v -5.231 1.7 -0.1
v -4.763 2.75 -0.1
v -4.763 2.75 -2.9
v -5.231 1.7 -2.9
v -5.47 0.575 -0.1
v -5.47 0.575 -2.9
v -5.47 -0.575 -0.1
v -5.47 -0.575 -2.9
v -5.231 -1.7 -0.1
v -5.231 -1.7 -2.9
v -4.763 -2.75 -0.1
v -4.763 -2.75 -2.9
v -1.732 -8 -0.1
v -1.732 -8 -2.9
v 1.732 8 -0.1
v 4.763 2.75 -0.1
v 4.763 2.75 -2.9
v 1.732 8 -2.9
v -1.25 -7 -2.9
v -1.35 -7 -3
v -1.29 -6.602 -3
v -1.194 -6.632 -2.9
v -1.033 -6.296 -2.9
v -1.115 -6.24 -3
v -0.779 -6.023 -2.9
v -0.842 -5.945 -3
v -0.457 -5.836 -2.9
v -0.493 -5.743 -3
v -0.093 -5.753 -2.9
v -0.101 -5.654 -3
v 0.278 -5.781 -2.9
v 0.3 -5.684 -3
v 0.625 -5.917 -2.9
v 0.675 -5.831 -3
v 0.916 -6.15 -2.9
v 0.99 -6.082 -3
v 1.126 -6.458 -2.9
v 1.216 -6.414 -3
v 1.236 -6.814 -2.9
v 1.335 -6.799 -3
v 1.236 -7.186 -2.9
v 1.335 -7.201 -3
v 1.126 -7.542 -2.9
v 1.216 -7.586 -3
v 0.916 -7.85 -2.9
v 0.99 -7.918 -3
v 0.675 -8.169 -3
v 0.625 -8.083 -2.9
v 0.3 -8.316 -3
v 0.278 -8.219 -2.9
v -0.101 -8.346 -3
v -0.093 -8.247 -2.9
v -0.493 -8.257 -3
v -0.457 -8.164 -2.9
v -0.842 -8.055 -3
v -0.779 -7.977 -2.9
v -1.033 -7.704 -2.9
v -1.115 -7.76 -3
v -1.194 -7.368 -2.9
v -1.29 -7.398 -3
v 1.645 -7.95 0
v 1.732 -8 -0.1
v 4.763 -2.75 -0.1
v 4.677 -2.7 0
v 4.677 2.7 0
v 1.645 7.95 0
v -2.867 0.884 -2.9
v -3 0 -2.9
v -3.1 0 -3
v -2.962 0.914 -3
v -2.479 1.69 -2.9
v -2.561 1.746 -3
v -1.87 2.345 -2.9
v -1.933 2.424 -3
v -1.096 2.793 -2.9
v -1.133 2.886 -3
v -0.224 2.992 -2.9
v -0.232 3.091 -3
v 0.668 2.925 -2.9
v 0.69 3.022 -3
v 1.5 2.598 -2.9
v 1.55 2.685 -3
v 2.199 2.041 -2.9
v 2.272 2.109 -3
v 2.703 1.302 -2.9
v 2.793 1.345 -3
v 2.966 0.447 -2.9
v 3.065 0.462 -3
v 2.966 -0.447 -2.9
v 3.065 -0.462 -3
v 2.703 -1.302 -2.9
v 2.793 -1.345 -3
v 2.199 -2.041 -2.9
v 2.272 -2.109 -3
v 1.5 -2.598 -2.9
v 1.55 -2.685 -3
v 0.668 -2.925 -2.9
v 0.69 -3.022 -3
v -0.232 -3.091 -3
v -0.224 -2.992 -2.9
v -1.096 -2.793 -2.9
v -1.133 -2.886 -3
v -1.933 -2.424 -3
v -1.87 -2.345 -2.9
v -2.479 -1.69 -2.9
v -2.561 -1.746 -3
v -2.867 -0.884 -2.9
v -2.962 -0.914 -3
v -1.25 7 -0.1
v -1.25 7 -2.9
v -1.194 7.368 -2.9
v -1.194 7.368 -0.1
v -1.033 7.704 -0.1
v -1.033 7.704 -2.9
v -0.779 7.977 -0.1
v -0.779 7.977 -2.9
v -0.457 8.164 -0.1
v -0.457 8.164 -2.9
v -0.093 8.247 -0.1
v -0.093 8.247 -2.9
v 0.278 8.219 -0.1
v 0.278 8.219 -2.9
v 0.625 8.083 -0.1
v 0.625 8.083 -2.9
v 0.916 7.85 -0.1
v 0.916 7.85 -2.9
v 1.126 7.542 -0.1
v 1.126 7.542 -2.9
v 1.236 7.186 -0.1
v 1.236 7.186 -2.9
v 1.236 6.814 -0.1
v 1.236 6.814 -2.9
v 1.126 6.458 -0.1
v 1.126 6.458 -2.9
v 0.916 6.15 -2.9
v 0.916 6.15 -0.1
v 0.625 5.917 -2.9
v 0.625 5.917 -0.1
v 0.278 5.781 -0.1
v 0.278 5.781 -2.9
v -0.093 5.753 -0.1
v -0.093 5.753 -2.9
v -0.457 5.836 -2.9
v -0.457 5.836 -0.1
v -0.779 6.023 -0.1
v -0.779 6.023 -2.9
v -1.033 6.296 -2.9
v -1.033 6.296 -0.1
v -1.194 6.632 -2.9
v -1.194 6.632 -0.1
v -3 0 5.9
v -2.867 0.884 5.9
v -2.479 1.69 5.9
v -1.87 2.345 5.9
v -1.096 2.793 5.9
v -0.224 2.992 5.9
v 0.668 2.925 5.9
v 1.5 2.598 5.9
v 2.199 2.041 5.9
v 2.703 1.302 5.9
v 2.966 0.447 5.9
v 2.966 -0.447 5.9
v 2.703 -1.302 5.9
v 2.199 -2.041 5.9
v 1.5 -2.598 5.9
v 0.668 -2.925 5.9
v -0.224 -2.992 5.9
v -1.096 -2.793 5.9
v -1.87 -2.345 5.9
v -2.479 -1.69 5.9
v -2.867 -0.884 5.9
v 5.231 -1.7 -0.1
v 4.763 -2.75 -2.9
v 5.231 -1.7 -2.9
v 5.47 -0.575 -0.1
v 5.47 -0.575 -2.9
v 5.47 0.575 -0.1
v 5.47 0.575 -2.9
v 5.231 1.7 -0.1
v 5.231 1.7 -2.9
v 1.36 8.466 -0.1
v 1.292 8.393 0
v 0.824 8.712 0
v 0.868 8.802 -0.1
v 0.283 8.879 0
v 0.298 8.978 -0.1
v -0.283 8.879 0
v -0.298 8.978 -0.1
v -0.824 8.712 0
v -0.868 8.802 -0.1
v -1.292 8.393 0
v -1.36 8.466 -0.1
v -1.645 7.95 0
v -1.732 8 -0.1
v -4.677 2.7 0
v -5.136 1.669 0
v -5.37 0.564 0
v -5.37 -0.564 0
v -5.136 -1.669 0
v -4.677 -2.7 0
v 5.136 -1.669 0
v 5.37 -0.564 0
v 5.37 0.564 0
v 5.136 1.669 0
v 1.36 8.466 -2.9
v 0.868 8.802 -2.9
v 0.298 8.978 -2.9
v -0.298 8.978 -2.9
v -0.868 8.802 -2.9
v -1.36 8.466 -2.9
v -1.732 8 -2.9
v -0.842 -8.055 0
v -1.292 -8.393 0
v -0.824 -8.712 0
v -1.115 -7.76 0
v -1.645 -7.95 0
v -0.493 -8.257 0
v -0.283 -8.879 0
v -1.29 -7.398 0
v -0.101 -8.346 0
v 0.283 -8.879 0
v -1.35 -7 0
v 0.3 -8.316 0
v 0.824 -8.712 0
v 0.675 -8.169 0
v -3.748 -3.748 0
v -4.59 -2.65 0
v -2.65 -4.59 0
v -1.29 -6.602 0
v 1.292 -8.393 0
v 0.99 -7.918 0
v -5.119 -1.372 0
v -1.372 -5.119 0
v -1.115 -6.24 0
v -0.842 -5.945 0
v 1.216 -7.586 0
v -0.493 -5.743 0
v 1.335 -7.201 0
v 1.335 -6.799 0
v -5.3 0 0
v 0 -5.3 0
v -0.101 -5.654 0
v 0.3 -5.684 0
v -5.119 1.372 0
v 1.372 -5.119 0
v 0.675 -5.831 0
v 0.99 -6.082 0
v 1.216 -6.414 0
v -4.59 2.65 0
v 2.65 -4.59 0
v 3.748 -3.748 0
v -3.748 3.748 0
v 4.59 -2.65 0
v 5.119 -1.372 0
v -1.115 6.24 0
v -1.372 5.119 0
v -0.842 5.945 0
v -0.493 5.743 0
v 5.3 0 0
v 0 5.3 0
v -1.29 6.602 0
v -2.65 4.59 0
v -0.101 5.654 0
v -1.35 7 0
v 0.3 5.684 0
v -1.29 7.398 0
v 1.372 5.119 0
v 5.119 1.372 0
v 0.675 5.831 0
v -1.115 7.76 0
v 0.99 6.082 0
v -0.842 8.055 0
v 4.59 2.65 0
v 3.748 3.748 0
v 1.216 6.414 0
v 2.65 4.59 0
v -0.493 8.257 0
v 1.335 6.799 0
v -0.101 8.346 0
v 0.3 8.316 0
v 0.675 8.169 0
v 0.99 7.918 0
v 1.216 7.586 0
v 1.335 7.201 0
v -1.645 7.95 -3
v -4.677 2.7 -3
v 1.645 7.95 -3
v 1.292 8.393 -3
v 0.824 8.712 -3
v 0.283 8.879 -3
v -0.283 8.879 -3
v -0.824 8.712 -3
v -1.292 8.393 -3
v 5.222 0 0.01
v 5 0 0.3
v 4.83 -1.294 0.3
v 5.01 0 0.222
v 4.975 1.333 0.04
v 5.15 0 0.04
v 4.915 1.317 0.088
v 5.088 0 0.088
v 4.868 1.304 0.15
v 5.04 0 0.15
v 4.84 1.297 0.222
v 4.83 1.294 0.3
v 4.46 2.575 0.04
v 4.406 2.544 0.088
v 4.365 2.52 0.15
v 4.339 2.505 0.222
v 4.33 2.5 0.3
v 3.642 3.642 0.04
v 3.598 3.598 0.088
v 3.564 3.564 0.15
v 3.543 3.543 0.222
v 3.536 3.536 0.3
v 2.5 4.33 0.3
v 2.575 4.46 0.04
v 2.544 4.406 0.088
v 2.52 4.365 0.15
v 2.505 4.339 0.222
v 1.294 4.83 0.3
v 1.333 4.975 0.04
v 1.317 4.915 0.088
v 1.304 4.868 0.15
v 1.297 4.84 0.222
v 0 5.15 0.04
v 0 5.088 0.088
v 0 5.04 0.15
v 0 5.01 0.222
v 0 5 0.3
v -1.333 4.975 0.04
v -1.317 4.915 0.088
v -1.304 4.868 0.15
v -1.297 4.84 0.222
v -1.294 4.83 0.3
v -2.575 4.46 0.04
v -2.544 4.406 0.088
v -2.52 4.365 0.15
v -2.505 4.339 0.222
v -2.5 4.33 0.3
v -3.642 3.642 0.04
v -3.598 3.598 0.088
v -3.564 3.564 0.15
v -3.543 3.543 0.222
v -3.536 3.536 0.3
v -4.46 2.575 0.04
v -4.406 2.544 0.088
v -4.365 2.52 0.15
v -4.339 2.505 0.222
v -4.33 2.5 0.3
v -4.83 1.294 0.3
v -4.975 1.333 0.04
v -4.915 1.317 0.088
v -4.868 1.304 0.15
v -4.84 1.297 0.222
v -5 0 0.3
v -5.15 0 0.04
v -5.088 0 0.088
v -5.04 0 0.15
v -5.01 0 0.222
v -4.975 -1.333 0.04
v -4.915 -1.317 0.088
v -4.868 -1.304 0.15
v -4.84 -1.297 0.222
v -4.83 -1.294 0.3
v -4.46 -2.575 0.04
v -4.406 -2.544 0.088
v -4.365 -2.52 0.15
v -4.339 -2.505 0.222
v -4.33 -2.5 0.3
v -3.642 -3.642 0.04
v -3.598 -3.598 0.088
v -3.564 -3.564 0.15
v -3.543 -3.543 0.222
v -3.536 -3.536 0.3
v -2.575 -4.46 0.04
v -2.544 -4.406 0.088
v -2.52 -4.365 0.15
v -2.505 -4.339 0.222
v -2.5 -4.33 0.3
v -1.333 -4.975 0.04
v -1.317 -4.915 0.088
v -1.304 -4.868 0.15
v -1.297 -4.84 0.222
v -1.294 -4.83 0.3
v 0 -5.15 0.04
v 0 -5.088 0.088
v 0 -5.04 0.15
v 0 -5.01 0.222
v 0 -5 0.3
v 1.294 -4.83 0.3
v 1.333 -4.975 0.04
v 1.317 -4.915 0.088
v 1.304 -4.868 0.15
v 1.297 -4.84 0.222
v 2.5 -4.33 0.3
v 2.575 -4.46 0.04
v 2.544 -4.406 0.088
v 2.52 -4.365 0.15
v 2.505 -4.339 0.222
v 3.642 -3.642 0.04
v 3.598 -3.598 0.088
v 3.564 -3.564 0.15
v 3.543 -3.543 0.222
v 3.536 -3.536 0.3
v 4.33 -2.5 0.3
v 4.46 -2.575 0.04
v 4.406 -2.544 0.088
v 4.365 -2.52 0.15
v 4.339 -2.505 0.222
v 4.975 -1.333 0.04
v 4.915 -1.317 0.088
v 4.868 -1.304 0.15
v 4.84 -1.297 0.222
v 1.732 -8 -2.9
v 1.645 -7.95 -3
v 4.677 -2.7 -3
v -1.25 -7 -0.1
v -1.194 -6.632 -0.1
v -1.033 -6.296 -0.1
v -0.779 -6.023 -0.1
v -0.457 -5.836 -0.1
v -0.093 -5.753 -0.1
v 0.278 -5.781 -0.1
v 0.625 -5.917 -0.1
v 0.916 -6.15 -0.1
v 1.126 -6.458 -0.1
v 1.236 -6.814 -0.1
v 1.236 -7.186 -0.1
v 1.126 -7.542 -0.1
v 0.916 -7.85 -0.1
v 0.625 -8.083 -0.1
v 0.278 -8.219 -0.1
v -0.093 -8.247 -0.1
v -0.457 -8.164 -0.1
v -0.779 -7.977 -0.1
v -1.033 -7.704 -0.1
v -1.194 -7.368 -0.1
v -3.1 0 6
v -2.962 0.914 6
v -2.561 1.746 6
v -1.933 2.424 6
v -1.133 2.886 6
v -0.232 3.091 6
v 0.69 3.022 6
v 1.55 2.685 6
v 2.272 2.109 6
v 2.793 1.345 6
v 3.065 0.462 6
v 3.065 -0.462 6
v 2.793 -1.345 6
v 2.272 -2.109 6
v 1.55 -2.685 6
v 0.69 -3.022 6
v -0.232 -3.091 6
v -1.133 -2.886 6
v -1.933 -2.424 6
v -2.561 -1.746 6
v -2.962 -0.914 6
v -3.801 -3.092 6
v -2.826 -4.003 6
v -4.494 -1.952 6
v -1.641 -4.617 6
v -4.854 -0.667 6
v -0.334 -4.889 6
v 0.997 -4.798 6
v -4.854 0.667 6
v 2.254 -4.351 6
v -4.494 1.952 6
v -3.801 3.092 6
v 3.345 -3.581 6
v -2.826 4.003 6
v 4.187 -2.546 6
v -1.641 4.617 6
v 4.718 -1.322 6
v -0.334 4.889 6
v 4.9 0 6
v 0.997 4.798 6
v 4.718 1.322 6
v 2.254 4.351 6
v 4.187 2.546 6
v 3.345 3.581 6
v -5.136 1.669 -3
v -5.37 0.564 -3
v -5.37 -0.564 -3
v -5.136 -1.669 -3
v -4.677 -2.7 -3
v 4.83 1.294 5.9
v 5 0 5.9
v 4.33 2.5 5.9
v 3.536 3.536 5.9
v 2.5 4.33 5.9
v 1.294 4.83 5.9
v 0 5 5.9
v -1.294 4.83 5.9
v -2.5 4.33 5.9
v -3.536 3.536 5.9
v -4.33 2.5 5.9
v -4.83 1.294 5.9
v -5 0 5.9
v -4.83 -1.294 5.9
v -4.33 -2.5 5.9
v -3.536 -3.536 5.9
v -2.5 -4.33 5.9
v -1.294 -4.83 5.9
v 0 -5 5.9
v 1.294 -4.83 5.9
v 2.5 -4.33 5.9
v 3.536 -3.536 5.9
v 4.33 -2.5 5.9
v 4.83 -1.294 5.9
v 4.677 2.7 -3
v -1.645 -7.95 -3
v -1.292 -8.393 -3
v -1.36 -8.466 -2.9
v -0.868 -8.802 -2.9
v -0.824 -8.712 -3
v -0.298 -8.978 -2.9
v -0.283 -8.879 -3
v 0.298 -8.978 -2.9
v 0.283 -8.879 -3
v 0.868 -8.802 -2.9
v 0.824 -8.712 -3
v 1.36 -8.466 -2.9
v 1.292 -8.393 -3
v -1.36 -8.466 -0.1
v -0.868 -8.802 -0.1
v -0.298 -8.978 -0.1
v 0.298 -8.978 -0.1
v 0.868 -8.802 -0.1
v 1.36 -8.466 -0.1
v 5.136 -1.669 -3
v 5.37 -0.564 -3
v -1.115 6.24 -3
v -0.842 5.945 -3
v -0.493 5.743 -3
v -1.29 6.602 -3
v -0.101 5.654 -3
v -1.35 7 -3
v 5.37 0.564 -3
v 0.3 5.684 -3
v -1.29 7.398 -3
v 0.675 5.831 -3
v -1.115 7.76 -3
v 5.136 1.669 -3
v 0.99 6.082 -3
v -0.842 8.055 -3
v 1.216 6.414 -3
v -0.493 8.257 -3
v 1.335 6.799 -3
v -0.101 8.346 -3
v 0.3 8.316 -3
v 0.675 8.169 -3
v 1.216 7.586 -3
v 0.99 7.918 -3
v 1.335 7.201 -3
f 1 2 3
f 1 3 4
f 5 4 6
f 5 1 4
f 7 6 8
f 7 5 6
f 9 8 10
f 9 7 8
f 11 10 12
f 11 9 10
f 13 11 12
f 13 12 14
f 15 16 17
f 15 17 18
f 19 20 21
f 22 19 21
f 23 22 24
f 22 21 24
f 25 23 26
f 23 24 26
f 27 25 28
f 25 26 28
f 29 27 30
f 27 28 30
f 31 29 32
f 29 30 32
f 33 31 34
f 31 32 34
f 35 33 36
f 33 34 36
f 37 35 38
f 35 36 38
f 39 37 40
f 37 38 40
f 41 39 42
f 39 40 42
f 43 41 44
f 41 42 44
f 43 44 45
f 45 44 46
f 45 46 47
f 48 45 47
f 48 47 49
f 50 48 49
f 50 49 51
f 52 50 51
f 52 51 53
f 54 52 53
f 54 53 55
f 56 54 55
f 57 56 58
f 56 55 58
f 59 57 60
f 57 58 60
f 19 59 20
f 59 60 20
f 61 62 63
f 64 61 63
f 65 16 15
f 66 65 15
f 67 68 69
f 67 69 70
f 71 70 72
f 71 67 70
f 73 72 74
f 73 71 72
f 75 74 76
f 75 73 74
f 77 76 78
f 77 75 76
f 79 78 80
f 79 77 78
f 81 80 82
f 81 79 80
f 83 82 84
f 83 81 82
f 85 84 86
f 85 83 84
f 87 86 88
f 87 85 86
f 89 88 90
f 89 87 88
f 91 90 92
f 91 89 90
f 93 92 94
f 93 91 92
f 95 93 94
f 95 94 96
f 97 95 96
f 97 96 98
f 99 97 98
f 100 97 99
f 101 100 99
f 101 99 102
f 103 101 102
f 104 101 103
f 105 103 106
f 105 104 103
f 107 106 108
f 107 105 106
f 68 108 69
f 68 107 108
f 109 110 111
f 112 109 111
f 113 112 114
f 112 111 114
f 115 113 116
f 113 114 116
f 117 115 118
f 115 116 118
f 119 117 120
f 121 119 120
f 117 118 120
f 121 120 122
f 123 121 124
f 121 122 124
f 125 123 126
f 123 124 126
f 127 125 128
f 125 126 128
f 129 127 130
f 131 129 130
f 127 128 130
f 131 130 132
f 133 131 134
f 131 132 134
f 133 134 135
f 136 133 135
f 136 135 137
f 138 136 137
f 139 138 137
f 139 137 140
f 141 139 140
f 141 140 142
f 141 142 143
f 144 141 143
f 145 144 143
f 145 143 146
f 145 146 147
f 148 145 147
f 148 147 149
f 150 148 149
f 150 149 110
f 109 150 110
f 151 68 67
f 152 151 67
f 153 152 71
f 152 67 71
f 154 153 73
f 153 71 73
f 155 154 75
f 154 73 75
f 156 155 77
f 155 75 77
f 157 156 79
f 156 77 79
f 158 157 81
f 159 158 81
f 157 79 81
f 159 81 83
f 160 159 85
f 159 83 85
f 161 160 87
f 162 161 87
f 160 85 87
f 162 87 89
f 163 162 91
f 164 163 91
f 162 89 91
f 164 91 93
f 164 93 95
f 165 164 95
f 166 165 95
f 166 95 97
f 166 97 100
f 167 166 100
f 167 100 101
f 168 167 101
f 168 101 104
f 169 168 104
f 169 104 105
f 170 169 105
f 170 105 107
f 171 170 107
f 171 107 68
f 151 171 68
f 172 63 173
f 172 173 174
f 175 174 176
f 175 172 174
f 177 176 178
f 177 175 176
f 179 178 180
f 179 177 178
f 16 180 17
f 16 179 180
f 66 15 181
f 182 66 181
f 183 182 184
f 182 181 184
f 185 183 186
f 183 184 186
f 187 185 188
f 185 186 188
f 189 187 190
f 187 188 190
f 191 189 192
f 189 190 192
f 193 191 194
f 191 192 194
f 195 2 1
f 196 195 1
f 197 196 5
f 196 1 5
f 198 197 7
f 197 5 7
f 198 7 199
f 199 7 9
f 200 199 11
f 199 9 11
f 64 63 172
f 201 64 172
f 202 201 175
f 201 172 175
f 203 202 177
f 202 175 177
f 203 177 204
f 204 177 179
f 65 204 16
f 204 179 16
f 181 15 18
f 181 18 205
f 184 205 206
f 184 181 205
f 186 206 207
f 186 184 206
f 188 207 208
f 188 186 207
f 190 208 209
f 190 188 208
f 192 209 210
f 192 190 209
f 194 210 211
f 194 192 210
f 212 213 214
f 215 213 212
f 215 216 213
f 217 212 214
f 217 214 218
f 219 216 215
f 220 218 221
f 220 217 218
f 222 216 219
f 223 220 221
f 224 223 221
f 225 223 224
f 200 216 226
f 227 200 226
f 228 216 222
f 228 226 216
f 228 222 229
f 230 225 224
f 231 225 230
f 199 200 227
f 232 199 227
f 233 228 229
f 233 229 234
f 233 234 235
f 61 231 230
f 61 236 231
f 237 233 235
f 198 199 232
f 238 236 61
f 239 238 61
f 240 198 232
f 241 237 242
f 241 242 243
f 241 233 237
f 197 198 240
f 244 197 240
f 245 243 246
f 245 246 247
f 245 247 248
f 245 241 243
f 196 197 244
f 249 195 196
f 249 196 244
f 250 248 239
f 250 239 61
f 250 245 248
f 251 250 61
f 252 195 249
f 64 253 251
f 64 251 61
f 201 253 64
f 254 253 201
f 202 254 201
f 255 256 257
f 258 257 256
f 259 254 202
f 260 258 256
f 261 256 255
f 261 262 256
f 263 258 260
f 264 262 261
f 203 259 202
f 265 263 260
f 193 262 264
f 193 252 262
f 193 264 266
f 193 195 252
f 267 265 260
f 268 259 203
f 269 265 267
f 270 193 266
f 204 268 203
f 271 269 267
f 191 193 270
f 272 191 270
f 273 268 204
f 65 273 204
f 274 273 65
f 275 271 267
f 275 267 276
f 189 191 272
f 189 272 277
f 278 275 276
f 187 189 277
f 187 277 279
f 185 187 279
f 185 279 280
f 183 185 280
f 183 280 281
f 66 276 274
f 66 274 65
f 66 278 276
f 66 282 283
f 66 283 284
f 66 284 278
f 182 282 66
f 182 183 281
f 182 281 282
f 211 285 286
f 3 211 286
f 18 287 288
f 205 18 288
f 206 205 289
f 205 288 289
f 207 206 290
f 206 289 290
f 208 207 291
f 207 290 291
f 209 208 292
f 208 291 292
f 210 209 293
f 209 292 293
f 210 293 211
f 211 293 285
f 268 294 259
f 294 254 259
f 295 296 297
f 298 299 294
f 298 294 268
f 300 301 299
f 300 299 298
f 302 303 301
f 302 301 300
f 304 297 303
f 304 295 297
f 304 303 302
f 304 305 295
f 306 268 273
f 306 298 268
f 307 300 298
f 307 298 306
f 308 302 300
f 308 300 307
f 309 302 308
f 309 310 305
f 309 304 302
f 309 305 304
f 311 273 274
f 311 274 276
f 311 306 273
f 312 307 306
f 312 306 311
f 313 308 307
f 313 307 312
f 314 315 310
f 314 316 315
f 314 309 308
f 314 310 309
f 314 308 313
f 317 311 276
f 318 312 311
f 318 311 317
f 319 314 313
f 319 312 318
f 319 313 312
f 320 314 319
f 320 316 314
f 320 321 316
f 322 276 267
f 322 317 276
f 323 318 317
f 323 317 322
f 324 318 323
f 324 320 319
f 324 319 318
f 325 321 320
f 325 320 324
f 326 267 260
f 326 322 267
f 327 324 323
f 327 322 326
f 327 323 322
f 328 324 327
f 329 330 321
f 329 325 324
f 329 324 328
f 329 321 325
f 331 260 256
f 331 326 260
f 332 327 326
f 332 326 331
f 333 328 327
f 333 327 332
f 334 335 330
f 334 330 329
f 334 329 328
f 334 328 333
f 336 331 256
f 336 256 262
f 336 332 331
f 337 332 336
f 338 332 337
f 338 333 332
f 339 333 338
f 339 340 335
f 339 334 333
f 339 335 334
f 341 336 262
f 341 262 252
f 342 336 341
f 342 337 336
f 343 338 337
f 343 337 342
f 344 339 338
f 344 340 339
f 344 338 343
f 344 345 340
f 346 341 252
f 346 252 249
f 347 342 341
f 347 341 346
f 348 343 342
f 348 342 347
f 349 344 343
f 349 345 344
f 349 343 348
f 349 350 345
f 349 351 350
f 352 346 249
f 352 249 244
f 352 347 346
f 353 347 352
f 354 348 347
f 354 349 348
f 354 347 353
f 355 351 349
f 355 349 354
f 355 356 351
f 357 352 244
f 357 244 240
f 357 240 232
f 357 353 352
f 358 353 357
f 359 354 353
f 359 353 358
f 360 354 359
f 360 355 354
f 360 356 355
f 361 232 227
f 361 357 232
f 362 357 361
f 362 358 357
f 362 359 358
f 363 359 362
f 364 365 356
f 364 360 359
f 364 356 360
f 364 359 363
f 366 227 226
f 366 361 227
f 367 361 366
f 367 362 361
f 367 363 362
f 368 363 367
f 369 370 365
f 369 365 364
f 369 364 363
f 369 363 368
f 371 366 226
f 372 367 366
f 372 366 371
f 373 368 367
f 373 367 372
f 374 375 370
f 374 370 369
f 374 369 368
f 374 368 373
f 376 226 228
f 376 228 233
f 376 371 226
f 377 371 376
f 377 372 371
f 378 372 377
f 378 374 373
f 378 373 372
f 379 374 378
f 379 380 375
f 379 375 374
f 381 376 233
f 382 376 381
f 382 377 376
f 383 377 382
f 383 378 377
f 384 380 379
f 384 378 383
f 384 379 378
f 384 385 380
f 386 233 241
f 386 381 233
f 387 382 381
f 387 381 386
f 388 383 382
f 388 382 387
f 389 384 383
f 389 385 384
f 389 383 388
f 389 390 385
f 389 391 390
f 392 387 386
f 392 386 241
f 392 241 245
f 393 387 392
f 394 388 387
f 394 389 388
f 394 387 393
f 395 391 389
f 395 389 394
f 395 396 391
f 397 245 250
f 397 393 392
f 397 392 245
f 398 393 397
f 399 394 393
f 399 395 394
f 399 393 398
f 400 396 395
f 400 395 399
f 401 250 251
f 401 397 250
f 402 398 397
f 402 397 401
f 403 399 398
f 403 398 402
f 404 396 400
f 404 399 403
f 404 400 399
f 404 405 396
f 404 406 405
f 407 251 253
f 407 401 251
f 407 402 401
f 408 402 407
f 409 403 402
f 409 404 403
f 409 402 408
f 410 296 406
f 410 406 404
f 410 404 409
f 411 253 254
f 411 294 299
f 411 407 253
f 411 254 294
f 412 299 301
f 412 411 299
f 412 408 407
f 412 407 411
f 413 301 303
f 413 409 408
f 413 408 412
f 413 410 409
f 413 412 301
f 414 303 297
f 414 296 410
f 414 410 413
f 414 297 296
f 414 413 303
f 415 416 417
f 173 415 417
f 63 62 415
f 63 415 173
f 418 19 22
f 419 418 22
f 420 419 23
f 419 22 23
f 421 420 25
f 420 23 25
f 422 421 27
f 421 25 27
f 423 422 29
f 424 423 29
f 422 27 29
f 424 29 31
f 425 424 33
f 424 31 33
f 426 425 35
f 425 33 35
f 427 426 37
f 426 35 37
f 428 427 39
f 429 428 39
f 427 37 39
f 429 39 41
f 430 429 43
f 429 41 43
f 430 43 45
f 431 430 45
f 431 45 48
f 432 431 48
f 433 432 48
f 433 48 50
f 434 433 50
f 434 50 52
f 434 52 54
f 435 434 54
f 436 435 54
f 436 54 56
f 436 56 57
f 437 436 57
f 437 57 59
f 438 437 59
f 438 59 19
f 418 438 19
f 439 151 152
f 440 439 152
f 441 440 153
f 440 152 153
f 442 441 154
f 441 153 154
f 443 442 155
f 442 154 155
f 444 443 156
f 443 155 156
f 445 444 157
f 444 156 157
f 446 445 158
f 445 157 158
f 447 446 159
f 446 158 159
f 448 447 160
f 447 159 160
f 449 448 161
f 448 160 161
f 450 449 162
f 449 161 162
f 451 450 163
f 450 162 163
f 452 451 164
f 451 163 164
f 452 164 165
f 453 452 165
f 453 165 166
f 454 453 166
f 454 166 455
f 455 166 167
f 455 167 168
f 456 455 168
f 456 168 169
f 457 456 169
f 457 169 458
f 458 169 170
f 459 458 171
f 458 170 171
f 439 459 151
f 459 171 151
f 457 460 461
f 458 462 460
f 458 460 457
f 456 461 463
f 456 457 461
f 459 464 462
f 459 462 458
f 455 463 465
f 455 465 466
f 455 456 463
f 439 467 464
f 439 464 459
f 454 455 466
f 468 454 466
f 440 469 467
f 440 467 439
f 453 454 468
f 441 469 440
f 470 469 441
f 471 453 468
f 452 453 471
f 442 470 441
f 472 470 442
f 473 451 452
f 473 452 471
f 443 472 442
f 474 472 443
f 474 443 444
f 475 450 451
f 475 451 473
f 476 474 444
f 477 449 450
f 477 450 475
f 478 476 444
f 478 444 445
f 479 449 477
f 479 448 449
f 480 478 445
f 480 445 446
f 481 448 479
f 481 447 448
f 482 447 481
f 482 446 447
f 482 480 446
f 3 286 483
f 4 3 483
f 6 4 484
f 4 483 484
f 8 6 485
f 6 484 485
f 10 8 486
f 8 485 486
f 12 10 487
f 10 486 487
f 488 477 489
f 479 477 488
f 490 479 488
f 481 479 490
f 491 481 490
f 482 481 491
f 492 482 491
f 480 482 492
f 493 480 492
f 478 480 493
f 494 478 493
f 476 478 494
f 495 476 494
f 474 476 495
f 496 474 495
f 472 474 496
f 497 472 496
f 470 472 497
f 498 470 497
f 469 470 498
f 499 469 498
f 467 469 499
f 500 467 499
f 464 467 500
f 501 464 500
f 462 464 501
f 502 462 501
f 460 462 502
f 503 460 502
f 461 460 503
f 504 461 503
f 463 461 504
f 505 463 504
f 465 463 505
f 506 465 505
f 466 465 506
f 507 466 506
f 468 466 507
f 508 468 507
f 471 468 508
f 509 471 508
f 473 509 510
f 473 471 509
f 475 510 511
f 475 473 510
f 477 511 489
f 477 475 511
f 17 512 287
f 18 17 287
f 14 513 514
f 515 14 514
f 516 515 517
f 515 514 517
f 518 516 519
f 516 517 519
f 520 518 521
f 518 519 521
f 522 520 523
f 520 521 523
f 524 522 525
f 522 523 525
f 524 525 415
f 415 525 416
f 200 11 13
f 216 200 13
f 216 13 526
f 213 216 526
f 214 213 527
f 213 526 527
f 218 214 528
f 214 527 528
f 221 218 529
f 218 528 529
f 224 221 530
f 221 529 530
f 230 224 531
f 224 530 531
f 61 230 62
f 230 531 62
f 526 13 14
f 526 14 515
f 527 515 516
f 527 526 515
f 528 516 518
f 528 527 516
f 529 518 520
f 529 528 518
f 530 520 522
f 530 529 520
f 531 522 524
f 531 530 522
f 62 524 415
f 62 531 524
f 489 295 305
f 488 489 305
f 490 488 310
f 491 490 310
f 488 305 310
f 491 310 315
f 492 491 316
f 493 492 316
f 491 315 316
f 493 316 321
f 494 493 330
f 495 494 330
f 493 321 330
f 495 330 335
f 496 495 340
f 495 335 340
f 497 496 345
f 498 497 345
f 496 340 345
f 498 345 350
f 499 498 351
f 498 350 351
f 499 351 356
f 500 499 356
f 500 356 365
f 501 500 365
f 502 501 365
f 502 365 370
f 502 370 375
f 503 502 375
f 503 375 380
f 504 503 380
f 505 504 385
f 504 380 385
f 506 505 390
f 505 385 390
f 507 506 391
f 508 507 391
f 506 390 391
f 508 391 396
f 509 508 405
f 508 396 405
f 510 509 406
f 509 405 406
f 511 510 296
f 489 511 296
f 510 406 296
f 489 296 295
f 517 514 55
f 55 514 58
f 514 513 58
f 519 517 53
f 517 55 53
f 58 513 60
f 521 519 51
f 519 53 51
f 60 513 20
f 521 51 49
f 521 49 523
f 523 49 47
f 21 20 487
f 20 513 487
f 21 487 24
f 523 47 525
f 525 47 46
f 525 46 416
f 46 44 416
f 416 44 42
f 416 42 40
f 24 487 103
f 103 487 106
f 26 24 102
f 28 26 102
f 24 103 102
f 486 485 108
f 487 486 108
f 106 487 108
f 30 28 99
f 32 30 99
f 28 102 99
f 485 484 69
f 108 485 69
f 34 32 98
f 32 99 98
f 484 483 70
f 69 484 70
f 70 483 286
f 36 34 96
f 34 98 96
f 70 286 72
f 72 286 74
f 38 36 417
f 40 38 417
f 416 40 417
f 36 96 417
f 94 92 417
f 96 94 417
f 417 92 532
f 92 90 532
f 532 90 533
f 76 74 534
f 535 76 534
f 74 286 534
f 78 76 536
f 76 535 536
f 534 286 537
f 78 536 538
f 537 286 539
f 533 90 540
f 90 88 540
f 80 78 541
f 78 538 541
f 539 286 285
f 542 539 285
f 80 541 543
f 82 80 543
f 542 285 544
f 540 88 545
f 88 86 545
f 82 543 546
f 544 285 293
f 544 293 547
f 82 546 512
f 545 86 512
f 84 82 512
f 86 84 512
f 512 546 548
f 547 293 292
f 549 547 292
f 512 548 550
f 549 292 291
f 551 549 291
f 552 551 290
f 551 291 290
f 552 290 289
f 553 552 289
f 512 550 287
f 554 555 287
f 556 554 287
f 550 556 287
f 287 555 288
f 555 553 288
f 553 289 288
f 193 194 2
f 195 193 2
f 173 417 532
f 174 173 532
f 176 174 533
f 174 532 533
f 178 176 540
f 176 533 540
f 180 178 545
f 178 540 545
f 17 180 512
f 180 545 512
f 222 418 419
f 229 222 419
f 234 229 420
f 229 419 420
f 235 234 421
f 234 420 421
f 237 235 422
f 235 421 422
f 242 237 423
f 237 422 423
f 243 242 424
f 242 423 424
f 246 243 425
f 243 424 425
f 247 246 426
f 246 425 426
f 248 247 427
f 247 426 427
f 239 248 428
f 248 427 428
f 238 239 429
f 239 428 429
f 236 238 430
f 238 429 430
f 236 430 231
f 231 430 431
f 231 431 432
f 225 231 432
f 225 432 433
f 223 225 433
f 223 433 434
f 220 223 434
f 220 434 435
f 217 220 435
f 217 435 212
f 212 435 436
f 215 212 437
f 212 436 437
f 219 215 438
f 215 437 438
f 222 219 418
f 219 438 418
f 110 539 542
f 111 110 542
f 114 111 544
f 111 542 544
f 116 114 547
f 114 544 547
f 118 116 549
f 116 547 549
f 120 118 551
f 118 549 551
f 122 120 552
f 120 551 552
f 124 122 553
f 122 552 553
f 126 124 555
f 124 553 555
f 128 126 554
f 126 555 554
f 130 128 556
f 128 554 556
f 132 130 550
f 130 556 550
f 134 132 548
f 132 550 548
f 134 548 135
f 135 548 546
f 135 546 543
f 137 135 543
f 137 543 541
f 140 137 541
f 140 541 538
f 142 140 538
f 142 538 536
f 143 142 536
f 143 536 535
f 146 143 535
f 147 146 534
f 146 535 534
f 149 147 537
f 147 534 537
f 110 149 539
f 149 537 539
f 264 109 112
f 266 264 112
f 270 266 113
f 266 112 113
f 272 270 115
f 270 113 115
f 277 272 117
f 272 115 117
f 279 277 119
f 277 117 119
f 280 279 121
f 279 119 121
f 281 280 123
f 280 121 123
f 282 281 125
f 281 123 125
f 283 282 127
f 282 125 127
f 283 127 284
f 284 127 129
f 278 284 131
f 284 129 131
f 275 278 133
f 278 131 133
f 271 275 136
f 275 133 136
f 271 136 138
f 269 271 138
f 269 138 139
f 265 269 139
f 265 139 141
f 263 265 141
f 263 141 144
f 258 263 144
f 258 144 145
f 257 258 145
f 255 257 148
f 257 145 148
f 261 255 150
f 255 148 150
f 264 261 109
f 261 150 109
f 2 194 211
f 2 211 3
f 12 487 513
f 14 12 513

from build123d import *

# Parameters (mm, degrees)
SKETCH1_R           = 5
BOSS_EXTRUDE1_DEPTH = 6
BOSS_EXTRUDE2_DEPTH = 3
SKETCH3_R           = 3
SKETCH3_R_2         = 1.25
CUT_EXTRUDE1_DEPTH  = 14.865424624
FILLET1_R           = 0.3
CHAMFER1_SIZE       = 0.1


with BuildPart() as part:
    # Sketch1 → Boss-Extrude1 (new body)
    with BuildSketch(Plane.XY):
        Circle(SKETCH1_R)
    extrude(amount=BOSS_EXTRUDE1_DEPTH)

    # Sketch2 → Boss-Extrude2 (add)
    with BuildSketch(Plane(origin=(0, 0, 0), x_dir=(-1, 0, 0), z_dir=(0, 0, -1))):
        with BuildLine():
            Line((-4.763139721, 2.75), (-1.732050808, 8))
            ThreePointArc((-1.732050808, 8), (0, 9), (1.732050808, 8))
            Line((1.732050808, 8), (4.763139721, 2.75))
            ThreePointArc((4.763139721, 2.75), (5.5, 0), (4.763139721, -2.75))
            Line((4.763139721, -2.75), (1.732050808, -8))
            ThreePointArc((1.732050808, -8), (0, -9), (-1.732050808, -8))
            Line((-1.732050808, -8), (-4.763139721, -2.75))
            ThreePointArc((-4.763139721, -2.75), (-5.5, 0), (-4.763139721, 2.75))
        make_face()
    extrude(amount=BOSS_EXTRUDE2_DEPTH)

    # Sketch3 → Cut-Extrude1 (cut, through all)
    with BuildSketch(Plane(origin=(0, 0, -3), x_dir=(-1, 0, 0), z_dir=(0, 0, -1))):
        Circle(SKETCH3_R)
        with Locations((0, 7)):
            Circle(SKETCH3_R_2)
        with Locations((0, -7)):
            Circle(SKETCH3_R_2)
    extrude(amount=-CUT_EXTRUDE1_DEPTH, mode=Mode.SUBTRACT)

    # Fillet1
    fillet1_edges = [part.edges().sort_by_distance(p)[0] for p in [
        (-5, 0, 0),
    ]]
    fillet(fillet1_edges, radius=FILLET1_R)

    # Chamfer1
    chamfer1_edges = [part.edges().sort_by_distance(p)[0] for p in [
        (-3.247595264, -5.375, -3),
        (-5.5, 0, -3),
        (-3.247595264, 5.375, -3),
        (0, 9, -3),
        (3.247595264, 5.375, -3),
        (1.25, -7, 0),
        (1.25, -7, -3),
        (1.25, 7, 0),
        (1.25, 7, -3),
        (3, 0, 6),
        (3, 0, -3),
        (-5, 0, 6),
        (5.5, 0, 0),
        (3.247595264, -5.375, 0),
        (0, -9, 0),
        (-3.247595264, -5.375, 0),
        (-5.5, 0, 0),
        (-3.247595264, 5.375, 0),
        (0, 9, 0),
        (3.247595264, 5.375, 0),
        (5.5, 0, -3),
        (3.247595264, -5.375, -3),
        (0, -9, -3),
    ]]
    chamfer(chamfer1_edges, length=CHAMFER1_SIZE)


solid = part.part
